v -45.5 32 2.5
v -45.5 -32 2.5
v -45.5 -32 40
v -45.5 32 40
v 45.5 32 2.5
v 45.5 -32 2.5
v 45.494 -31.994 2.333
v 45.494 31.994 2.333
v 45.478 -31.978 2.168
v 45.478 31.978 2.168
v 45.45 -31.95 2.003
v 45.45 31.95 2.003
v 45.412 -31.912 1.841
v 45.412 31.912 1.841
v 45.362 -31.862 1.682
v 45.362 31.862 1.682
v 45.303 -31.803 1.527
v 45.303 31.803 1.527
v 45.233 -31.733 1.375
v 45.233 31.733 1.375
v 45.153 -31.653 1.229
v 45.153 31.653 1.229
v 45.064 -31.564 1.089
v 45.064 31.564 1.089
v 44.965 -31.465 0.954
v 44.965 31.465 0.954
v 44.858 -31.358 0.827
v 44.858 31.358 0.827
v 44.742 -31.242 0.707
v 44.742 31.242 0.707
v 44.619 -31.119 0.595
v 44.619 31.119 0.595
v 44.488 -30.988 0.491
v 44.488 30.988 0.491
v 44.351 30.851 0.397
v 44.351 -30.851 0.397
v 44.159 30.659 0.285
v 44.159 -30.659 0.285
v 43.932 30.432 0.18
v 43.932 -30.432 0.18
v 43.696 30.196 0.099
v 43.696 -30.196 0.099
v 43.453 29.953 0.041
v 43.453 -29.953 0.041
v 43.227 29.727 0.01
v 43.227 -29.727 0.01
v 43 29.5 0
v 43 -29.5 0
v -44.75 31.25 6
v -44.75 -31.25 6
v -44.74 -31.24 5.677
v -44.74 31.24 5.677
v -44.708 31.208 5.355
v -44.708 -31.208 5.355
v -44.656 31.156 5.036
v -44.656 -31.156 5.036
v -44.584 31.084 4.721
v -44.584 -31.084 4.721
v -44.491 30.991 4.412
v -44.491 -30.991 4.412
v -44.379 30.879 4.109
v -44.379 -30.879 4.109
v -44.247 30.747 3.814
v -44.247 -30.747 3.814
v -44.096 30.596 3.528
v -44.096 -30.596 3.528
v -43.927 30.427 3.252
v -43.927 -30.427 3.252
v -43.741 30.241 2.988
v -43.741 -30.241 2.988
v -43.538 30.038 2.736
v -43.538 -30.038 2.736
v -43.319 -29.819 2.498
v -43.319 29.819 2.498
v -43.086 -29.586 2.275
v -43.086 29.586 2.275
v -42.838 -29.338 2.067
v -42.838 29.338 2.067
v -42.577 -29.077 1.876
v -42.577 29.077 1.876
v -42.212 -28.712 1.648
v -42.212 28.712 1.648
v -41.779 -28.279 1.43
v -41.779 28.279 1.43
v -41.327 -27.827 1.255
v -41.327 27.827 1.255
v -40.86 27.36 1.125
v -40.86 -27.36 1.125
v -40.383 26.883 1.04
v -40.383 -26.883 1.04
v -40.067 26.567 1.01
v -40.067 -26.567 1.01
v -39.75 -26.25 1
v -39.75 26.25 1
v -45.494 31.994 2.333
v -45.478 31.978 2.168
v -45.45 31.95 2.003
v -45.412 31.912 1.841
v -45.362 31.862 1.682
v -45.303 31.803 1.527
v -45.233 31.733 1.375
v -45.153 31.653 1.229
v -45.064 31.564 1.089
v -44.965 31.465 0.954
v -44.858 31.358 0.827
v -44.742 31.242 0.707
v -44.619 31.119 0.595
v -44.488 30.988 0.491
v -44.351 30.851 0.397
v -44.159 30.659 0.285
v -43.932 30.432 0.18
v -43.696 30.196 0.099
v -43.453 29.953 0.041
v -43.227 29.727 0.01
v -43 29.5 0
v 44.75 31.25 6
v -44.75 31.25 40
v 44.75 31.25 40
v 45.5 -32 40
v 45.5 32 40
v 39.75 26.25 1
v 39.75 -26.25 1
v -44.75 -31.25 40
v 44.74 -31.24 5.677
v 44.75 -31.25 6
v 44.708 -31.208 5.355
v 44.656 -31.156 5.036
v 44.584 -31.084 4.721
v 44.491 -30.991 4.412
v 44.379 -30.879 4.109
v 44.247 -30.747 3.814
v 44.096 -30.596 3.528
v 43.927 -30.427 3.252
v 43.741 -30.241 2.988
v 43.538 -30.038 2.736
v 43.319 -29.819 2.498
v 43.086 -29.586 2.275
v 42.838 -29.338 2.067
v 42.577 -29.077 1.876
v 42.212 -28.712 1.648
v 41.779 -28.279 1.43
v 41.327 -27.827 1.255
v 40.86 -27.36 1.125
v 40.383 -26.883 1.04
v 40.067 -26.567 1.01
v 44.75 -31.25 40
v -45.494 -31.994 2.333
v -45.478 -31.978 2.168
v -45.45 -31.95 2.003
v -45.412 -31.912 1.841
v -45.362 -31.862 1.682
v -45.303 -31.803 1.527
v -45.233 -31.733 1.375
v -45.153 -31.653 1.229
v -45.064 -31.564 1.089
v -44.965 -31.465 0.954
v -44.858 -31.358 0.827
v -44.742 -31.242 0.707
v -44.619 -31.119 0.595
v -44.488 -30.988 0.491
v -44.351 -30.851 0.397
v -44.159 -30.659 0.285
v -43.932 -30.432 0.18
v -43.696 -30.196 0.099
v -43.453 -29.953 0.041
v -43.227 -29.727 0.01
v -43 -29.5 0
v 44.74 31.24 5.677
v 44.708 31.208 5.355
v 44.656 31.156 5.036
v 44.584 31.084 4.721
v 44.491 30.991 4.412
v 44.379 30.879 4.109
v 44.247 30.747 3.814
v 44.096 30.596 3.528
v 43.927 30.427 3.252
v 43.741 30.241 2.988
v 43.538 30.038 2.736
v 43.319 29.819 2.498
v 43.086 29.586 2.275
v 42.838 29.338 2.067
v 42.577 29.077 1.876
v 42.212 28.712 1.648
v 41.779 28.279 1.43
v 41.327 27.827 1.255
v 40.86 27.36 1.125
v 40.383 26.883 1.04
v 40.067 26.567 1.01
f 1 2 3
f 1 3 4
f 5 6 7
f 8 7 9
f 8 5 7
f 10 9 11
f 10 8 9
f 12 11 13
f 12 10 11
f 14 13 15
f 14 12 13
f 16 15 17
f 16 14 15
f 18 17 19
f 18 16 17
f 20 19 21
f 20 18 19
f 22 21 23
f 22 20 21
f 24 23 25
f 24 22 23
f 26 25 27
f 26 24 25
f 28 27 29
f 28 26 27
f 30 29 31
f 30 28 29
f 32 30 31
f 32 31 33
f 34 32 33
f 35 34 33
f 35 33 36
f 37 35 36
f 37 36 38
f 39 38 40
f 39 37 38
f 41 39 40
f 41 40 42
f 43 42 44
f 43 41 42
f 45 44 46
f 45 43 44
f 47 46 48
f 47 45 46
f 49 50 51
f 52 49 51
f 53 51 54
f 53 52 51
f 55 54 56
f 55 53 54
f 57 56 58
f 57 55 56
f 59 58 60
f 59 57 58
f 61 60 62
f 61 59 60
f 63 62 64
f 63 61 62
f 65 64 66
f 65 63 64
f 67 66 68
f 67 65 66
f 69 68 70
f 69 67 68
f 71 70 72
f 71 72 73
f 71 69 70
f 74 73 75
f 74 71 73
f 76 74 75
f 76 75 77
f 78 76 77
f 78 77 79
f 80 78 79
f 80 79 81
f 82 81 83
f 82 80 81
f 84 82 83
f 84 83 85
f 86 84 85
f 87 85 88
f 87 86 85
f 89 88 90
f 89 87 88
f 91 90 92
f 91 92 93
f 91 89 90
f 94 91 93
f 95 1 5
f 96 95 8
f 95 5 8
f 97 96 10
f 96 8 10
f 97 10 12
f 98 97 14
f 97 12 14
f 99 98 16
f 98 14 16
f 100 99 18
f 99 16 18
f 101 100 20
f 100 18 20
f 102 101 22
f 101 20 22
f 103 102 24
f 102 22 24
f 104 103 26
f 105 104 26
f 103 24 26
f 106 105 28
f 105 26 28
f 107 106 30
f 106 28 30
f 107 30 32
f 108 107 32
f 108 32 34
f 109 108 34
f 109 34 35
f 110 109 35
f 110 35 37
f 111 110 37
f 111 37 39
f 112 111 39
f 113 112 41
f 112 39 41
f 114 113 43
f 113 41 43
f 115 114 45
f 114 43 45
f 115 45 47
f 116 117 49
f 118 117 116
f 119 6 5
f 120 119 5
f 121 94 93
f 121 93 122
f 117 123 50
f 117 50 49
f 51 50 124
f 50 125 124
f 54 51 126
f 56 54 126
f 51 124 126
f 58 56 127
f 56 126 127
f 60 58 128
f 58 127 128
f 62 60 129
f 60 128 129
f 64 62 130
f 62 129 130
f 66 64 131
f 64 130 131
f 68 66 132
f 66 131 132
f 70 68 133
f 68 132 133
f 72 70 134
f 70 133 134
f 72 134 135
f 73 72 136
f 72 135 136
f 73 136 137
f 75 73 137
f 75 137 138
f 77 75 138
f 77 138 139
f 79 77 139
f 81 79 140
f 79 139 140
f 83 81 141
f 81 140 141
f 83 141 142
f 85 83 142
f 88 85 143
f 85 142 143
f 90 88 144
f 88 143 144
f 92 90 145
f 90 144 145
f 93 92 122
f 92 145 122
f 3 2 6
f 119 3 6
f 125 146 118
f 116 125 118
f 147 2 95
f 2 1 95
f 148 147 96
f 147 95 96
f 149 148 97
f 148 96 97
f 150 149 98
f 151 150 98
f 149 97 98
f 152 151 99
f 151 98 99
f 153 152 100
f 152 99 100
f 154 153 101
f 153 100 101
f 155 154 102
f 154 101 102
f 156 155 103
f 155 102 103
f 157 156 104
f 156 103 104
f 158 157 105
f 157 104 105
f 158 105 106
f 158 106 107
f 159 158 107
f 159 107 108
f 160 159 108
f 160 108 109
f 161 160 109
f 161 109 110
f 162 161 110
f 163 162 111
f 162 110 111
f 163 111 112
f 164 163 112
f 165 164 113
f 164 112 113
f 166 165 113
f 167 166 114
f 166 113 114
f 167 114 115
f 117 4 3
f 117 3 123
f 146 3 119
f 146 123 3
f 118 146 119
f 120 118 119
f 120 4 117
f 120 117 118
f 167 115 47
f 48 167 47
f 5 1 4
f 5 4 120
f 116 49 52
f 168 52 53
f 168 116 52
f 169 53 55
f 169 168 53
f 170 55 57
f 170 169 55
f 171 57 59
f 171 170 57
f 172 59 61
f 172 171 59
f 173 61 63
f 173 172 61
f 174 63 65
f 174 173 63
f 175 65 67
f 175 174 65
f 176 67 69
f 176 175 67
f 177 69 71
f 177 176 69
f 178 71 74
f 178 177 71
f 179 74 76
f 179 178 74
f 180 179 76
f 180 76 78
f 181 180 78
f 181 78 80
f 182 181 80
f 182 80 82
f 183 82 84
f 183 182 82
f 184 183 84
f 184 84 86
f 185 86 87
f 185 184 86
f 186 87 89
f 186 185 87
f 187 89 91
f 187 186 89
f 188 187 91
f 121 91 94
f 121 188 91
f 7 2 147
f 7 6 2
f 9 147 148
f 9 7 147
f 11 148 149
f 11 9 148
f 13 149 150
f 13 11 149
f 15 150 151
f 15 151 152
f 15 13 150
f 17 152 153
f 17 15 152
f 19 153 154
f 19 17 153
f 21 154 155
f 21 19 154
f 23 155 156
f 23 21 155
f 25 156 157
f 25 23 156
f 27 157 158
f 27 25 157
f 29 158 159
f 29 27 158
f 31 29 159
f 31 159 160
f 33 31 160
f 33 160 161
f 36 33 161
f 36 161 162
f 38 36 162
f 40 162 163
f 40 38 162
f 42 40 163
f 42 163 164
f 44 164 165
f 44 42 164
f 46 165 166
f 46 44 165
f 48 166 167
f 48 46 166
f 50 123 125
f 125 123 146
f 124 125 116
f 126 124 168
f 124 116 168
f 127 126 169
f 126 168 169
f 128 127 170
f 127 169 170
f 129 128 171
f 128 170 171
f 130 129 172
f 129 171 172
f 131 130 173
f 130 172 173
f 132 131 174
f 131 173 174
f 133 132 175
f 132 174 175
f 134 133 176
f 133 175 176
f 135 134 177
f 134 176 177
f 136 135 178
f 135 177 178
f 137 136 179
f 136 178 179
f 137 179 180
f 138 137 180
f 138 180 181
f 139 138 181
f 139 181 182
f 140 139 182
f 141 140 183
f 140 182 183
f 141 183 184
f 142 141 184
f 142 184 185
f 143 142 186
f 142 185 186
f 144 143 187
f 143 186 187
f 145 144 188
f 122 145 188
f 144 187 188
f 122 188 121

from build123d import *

# Parameters (mm, degrees)
F0_W     = 91
F0_H     = 64
F1_DEPTH = 40
F2_W     = 89.5
F2_H     = 62.5
F3_DEPTH = 39
F4_R     = 5
F5_R     = 2.5


with BuildPart() as f1:
    # F0 (on Top) → F1 (new body)
    with BuildSketch(Plane.XY):
        Rectangle(F0_W, F0_H)
    extrude(amount=F1_DEPTH)

    # F2 (on face) → F3 (cut)
    with BuildSketch(Plane.XY.offset(40)):
        Rectangle(F2_W, F2_H)
    extrude(amount=-F3_DEPTH, mode=Mode.SUBTRACT)

    # F4
    f4_edges = [f1.edges().sort_by_distance(p)[0] for p in [
        (0, 31.25, 1),
        (-44.75, 0, 1),
        (0, -31.25, 1),
        (44.75, 0, 1),
    ]]
    fillet(f4_edges, radius=F4_R)

    # F5
    f5_edges = [f1.edges().sort_by_distance(p)[0] for p in [
        (45.5, 0, 0),
        (0, 32, 0),
        (-45.5, 0, 0),
        (0, -32, 0),
    ]]
    fillet(f5_edges, radius=F5_R)


solid = f1.part
